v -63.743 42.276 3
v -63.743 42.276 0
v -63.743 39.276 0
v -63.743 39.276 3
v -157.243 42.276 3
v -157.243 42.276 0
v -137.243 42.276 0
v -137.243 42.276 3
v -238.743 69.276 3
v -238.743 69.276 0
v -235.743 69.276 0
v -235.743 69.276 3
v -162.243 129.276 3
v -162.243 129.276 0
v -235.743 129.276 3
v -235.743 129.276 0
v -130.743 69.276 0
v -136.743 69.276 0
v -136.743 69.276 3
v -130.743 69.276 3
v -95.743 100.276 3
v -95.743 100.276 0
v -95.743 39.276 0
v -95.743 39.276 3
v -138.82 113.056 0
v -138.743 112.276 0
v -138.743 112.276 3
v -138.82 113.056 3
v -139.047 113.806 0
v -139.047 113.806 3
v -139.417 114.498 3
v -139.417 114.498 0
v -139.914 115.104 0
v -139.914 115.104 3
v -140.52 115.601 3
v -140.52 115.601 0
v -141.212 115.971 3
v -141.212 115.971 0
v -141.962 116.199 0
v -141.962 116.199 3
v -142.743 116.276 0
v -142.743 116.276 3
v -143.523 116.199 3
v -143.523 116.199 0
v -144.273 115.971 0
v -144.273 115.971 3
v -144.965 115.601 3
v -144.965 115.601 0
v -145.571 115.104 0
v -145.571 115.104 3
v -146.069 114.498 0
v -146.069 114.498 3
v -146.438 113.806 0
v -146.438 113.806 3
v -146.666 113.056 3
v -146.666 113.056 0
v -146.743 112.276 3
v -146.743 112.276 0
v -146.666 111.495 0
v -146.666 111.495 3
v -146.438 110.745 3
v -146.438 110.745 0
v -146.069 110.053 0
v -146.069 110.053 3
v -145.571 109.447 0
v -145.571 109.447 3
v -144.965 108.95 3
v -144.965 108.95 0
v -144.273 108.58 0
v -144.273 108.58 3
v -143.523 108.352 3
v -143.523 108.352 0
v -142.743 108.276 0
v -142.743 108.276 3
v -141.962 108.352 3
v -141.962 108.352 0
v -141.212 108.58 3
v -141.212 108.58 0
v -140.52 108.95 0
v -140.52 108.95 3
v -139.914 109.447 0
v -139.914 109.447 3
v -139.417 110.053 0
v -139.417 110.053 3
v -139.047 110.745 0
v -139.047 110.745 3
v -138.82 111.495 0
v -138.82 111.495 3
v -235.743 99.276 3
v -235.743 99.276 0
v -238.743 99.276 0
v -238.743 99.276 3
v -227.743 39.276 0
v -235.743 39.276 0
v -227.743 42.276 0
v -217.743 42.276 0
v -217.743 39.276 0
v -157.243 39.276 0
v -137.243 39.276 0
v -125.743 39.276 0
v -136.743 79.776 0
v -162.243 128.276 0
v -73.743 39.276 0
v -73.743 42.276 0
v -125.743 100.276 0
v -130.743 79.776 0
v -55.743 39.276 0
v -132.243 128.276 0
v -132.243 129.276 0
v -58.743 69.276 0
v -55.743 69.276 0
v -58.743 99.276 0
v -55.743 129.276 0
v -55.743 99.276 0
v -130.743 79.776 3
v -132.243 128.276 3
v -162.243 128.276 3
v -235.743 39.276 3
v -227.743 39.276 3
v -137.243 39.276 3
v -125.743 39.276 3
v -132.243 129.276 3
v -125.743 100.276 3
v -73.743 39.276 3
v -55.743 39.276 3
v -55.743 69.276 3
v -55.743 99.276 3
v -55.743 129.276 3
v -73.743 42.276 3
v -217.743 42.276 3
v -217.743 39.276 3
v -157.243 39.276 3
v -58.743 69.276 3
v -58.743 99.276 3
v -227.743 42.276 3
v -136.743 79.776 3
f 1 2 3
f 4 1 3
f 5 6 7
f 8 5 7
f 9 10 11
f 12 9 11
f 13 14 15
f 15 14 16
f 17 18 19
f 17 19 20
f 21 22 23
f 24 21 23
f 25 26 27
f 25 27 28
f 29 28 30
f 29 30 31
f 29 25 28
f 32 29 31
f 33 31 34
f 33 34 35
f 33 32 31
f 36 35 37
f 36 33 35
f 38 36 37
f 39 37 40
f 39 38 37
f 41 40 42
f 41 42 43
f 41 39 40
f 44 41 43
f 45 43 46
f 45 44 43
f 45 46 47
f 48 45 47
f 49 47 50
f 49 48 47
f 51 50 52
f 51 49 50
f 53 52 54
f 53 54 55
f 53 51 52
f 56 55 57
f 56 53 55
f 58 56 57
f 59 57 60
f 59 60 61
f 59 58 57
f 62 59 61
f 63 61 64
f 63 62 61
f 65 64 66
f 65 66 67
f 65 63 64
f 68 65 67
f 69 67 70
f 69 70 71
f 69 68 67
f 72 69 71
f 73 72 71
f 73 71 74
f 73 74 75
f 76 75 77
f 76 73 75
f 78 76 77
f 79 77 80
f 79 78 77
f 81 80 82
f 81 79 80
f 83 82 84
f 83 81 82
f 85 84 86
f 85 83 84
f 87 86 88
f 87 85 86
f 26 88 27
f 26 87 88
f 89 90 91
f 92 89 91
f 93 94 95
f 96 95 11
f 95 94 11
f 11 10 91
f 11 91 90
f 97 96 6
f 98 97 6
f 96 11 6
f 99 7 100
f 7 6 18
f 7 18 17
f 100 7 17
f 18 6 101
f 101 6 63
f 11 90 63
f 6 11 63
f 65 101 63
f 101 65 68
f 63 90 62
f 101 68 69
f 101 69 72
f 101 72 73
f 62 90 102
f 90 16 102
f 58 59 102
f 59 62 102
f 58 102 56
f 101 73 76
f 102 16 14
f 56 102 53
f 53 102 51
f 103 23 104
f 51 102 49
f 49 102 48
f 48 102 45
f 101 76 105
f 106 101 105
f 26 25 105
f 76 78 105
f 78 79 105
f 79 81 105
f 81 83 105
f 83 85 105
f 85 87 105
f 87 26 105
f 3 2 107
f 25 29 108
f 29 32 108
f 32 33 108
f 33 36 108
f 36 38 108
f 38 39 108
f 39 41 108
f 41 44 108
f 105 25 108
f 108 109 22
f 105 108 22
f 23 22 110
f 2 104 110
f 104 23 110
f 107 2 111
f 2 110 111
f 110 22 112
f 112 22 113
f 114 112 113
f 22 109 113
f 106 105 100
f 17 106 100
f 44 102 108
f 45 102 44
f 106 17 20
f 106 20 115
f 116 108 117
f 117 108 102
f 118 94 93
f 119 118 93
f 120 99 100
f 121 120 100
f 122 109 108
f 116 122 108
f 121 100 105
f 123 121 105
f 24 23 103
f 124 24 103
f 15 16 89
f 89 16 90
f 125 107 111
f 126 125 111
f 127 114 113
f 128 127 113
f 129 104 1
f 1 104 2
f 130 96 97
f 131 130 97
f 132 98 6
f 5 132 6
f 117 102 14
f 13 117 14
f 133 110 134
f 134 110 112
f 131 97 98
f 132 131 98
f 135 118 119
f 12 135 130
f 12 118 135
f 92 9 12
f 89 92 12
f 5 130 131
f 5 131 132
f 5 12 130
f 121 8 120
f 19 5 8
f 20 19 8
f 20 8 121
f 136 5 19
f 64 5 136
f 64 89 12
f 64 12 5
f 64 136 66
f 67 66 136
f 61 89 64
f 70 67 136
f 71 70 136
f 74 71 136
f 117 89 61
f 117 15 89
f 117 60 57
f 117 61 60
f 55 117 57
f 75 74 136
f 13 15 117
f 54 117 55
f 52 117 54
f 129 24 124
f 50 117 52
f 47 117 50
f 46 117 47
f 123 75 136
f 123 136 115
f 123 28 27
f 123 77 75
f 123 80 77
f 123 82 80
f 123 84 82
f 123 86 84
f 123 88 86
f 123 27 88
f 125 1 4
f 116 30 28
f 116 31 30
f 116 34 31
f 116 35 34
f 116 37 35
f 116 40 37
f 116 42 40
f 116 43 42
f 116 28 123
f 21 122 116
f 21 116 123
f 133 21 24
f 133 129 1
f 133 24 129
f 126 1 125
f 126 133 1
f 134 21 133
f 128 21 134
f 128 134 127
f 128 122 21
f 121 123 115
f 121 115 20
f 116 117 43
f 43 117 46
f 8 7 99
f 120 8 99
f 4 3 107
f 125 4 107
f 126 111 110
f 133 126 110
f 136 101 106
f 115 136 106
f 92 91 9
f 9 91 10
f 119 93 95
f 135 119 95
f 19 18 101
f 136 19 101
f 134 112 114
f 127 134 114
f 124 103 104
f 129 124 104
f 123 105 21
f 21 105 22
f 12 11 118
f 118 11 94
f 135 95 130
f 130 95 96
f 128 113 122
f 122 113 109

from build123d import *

# Parameters (mm, degrees)
MODEL_R             = 4
MODEL_W             = 6
MODEL_H             = 10.5
BOSS_EXTRUDE1_DEPTH = 3


with BuildPart() as part:
    # Model → Boss-Extrude1 (new body)
    with BuildSketch(Plane.XY):
        Polygon((-215.742718731, 39.275539879), (-157.242718731, 39.275539879), (-157.242718731, 42.275539879), (-137.242718731, 42.275539879), (-137.242718731, 39.275539879), (-125.742718731, 39.275539879), (-125.742718731, 100.275539879), (-95.742718731, 100.275539879), (-95.742718731, 39.275539879), (-73.742718731, 39.275539879), (-73.742718731, 42.275539879), (-63.742718731, 42.275539879), (-63.742718731, 39.275539879), (-55.742718731, 39.275539879), (-55.742718731, 69.275539879), (-58.742718731, 69.275539879), (-58.742718731, 99.275539879), (-55.742718731, 99.275539879), (-55.742718731, 129.275539879), (-132.242718731, 129.275539879), (-132.242718731, 128.275539879), (-162.242718731, 128.275539879), (-162.242718731, 129.275539879), (-235.742718731, 129.275539879), (-235.742718731, 99.275539879), (-238.742718731, 99.275539879), (-238.742718731, 69.275539879), (-235.742718731, 69.275539879), (-235.742718731, 39.275539879), (-227.742718731, 39.275539879), (-227.742718731, 42.275539879), (-217.742718731, 42.275539879), (-217.742718731, 39.275539879), align=None)
        with Locations((-142.742718731, 112.275539879)):
            Circle(MODEL_R, mode=Mode.SUBTRACT)
        with Locations((-133.742718731, 74.525539879)):
            Rectangle(MODEL_W, MODEL_H, mode=Mode.SUBTRACT)
    extrude(amount=BOSS_EXTRUDE1_DEPTH)


solid = part.part
